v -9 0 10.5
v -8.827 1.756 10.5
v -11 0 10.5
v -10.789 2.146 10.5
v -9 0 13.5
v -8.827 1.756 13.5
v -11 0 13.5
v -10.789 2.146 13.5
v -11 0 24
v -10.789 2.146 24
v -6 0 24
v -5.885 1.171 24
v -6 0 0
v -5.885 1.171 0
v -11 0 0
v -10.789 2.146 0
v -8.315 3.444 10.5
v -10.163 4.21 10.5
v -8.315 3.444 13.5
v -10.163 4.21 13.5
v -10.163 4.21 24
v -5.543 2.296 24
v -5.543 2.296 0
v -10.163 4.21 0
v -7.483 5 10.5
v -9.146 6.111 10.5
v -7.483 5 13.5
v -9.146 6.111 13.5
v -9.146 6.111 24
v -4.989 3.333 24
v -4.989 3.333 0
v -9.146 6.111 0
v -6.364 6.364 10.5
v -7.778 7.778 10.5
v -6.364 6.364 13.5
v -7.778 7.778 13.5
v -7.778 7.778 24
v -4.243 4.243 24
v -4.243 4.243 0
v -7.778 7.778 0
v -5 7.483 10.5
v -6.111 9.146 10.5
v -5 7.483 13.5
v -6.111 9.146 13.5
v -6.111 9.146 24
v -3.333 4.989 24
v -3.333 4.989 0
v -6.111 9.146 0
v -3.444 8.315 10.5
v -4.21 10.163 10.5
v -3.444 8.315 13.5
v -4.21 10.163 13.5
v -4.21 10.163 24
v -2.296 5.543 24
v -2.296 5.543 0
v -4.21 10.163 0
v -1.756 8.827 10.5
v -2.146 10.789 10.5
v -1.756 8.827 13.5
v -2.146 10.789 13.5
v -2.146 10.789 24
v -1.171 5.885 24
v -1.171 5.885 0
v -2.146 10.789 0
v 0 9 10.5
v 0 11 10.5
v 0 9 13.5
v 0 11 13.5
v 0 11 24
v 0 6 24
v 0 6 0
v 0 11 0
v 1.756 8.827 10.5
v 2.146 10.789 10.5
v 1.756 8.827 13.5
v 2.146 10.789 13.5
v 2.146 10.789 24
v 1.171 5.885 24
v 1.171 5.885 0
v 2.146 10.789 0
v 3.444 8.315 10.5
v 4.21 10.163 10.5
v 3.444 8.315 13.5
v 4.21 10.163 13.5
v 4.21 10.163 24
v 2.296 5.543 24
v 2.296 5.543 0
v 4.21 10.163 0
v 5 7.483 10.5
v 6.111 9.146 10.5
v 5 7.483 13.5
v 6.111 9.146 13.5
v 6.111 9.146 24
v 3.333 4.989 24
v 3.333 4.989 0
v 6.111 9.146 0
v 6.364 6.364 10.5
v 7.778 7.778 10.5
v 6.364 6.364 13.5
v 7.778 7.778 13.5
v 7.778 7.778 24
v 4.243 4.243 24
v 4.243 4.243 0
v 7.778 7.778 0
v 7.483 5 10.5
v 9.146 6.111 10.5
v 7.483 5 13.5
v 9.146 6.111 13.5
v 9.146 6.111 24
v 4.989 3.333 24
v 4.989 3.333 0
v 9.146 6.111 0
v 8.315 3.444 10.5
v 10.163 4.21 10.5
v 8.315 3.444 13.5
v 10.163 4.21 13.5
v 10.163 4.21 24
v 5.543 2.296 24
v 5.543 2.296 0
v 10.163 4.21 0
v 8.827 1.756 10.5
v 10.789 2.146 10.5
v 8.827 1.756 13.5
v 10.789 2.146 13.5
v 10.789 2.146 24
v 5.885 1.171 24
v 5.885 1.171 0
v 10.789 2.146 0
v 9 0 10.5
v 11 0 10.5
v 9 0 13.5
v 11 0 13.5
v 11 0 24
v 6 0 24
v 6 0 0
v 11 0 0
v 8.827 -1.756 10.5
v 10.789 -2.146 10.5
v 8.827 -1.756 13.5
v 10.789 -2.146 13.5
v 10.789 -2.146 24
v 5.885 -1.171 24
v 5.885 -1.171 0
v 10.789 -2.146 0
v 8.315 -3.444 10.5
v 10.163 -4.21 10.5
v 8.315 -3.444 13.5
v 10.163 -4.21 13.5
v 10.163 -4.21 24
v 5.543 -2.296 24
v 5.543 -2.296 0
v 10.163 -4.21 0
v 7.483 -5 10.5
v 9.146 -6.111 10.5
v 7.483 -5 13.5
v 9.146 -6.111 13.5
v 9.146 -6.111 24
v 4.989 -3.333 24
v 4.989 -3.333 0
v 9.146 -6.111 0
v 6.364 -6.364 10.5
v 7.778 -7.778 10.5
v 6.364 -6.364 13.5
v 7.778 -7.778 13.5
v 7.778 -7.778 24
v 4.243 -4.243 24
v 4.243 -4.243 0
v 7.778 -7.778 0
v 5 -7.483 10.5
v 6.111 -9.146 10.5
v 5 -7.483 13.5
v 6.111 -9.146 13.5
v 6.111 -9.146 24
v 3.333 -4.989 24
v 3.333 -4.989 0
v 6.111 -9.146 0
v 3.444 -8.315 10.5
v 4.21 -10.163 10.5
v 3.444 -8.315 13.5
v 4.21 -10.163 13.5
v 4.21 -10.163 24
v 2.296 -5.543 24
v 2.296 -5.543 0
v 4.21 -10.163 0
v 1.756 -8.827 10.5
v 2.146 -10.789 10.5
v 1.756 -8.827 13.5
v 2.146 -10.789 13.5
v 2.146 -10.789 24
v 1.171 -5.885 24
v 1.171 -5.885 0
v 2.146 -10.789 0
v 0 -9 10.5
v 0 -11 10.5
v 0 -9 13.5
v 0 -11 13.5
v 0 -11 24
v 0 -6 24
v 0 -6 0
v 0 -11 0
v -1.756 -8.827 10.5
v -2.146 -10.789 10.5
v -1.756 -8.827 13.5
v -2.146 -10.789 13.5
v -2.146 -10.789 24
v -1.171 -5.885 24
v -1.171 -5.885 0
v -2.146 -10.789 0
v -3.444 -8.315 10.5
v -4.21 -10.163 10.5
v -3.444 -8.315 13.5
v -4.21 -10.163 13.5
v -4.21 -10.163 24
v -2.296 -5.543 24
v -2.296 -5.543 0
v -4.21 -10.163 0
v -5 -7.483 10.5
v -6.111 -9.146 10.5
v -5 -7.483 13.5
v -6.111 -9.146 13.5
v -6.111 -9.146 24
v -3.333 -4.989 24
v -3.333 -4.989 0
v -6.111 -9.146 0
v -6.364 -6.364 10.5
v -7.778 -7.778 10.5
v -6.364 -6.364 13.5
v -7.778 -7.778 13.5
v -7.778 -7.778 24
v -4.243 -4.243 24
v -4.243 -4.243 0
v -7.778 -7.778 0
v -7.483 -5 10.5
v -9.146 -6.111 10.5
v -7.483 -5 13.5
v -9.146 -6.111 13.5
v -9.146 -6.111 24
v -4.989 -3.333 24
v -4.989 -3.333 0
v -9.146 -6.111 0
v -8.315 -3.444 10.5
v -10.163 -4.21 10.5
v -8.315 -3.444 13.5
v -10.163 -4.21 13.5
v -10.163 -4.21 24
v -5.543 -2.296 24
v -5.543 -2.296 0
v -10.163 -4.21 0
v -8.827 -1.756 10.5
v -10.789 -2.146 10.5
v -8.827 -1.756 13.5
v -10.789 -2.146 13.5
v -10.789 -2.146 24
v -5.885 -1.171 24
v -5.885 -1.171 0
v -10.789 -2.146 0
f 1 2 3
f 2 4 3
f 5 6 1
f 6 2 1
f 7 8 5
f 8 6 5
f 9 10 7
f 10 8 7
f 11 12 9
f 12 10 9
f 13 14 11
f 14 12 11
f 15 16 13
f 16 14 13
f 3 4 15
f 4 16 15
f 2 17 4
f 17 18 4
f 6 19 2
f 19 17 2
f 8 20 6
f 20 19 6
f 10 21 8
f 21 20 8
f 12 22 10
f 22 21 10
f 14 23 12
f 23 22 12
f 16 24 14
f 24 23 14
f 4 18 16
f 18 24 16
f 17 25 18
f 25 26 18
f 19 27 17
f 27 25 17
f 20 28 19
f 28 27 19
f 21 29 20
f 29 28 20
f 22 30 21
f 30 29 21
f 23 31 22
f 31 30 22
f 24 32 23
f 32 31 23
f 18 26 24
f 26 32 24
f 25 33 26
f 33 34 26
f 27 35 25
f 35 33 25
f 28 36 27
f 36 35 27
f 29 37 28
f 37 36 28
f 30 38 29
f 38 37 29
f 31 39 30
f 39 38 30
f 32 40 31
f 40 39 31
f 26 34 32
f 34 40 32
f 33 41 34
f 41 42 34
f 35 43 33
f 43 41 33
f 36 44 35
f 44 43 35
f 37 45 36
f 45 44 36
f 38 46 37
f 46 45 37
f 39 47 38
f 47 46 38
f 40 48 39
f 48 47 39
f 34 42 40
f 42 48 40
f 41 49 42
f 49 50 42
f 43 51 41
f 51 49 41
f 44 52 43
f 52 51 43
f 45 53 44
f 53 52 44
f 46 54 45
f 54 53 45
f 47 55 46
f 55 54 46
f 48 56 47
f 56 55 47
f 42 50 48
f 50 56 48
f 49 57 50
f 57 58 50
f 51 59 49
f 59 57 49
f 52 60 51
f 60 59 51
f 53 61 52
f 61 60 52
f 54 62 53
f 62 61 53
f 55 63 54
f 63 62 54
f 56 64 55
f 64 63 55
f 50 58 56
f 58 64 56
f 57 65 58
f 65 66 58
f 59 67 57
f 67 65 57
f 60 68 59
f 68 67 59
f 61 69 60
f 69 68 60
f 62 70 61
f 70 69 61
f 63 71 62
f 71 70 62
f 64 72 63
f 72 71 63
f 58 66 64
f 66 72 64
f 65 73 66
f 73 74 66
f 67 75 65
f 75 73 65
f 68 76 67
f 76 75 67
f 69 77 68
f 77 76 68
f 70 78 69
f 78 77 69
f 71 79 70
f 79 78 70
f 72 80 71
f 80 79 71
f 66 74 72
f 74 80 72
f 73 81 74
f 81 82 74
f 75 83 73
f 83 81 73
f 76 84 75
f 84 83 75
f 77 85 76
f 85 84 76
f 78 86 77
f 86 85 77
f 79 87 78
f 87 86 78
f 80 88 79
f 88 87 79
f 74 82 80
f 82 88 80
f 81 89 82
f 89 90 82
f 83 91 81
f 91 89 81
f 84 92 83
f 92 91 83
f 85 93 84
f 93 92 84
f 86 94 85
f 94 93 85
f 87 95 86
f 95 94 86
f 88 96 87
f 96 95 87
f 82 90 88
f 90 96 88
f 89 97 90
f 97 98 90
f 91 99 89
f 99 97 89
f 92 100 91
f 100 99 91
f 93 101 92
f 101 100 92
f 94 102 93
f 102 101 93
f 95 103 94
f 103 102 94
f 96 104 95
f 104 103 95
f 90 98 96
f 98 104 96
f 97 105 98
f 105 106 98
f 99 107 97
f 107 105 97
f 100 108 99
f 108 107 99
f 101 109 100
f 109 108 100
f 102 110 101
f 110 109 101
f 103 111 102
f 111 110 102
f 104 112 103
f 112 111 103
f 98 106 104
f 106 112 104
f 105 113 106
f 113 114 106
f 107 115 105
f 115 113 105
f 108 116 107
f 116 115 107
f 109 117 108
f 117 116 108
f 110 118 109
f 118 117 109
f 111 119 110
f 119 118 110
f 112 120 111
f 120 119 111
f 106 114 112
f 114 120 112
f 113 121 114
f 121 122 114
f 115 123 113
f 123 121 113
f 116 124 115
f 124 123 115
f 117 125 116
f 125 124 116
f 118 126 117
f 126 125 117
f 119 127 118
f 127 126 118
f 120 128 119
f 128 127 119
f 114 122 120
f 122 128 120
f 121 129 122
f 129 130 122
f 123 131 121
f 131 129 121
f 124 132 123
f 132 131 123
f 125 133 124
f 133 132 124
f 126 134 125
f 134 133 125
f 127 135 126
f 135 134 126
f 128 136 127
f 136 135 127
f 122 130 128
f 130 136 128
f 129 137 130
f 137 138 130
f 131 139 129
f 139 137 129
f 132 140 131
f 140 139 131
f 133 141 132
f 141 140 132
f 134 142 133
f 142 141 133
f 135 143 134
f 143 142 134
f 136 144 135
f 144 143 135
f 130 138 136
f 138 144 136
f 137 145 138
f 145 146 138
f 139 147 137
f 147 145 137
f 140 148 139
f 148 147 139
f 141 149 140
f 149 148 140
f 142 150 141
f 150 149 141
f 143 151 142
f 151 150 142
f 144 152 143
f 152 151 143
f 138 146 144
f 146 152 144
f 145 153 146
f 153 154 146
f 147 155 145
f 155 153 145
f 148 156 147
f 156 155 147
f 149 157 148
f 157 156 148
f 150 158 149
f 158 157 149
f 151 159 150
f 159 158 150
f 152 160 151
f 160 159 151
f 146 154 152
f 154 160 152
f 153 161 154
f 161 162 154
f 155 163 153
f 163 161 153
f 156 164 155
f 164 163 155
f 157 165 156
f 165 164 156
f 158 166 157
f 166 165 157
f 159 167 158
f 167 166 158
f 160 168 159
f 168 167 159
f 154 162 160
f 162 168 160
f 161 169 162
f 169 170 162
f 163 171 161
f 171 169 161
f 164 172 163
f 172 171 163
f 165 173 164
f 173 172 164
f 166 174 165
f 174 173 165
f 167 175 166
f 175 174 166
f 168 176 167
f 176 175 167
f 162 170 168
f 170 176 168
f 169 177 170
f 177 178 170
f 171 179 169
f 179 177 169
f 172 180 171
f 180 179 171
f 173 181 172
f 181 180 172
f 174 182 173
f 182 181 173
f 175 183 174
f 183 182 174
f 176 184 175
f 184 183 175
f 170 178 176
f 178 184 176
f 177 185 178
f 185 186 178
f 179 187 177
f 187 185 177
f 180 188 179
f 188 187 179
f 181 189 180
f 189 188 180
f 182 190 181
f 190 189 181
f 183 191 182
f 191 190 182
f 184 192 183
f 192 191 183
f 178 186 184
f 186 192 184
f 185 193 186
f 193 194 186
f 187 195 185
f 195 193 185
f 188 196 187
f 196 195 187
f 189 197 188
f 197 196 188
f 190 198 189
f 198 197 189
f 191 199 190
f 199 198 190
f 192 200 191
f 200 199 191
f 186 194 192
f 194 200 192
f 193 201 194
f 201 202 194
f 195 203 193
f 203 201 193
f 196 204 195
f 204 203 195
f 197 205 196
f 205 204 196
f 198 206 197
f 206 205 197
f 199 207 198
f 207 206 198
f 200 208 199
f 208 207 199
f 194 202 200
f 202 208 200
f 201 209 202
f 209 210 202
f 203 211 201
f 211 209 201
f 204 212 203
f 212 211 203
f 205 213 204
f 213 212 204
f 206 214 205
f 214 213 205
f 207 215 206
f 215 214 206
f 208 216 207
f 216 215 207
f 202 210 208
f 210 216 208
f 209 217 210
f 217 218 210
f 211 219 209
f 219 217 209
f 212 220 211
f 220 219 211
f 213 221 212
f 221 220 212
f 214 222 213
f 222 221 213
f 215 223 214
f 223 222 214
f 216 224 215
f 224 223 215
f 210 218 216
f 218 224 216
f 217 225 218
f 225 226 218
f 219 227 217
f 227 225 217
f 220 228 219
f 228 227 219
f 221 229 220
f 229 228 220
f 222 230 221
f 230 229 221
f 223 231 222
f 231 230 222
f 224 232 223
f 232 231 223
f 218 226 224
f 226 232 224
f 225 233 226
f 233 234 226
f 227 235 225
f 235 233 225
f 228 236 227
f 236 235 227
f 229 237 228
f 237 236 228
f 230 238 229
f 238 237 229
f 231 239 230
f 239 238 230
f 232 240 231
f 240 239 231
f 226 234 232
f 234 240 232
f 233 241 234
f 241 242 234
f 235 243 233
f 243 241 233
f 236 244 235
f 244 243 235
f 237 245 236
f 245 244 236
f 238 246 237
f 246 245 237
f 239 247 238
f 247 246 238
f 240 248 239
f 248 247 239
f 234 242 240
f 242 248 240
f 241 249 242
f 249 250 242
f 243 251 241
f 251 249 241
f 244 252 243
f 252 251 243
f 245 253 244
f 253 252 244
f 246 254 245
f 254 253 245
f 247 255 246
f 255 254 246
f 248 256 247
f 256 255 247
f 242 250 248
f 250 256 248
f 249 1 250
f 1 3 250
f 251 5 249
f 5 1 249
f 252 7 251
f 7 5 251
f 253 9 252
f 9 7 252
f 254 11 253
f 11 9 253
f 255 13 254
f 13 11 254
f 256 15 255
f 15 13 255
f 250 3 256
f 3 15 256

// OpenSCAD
$fn = 32;

// ----------------------------------------------------------------------
// Grooved revolve: plain_grooves, bore R6
// ----------------------------------------------------------------------

// --- parameters (mm) ---
bore_r = 6;               // bore radius
outer_r = 11;             // outer radius of the body
total_h = 24;             // overall height, Z
wall = 5;                 // radial wall thickness
groove_w = 3;             // groove width
groove_d = 2;             // groove depth
grooves = 1;              // number of outer grooves
fit_tol = 0.1;            // declared fit tolerance (prompt contract)
free_tol = 0.5;           // declared free tolerance (prompt contract)

bbox_x = 2 * outer_r;  // full diameter
bore_d = 2 * bore_r;  // bore diameter
body_d = 2 * outer_r;  // body diameter
revolve_angle = 360;  // full turn around the Z axis

profile = [[6, 0], [11, 0], [11, 10.5], [9, 10.5], [9, 13.5], [11, 13.5], [11, 24], [6, 24]];  // primary outline, 8 points, counter clockwise

// --- the one profile operation ---
rotate_extrude(angle = revolve_angle) polygon(points = profile);
